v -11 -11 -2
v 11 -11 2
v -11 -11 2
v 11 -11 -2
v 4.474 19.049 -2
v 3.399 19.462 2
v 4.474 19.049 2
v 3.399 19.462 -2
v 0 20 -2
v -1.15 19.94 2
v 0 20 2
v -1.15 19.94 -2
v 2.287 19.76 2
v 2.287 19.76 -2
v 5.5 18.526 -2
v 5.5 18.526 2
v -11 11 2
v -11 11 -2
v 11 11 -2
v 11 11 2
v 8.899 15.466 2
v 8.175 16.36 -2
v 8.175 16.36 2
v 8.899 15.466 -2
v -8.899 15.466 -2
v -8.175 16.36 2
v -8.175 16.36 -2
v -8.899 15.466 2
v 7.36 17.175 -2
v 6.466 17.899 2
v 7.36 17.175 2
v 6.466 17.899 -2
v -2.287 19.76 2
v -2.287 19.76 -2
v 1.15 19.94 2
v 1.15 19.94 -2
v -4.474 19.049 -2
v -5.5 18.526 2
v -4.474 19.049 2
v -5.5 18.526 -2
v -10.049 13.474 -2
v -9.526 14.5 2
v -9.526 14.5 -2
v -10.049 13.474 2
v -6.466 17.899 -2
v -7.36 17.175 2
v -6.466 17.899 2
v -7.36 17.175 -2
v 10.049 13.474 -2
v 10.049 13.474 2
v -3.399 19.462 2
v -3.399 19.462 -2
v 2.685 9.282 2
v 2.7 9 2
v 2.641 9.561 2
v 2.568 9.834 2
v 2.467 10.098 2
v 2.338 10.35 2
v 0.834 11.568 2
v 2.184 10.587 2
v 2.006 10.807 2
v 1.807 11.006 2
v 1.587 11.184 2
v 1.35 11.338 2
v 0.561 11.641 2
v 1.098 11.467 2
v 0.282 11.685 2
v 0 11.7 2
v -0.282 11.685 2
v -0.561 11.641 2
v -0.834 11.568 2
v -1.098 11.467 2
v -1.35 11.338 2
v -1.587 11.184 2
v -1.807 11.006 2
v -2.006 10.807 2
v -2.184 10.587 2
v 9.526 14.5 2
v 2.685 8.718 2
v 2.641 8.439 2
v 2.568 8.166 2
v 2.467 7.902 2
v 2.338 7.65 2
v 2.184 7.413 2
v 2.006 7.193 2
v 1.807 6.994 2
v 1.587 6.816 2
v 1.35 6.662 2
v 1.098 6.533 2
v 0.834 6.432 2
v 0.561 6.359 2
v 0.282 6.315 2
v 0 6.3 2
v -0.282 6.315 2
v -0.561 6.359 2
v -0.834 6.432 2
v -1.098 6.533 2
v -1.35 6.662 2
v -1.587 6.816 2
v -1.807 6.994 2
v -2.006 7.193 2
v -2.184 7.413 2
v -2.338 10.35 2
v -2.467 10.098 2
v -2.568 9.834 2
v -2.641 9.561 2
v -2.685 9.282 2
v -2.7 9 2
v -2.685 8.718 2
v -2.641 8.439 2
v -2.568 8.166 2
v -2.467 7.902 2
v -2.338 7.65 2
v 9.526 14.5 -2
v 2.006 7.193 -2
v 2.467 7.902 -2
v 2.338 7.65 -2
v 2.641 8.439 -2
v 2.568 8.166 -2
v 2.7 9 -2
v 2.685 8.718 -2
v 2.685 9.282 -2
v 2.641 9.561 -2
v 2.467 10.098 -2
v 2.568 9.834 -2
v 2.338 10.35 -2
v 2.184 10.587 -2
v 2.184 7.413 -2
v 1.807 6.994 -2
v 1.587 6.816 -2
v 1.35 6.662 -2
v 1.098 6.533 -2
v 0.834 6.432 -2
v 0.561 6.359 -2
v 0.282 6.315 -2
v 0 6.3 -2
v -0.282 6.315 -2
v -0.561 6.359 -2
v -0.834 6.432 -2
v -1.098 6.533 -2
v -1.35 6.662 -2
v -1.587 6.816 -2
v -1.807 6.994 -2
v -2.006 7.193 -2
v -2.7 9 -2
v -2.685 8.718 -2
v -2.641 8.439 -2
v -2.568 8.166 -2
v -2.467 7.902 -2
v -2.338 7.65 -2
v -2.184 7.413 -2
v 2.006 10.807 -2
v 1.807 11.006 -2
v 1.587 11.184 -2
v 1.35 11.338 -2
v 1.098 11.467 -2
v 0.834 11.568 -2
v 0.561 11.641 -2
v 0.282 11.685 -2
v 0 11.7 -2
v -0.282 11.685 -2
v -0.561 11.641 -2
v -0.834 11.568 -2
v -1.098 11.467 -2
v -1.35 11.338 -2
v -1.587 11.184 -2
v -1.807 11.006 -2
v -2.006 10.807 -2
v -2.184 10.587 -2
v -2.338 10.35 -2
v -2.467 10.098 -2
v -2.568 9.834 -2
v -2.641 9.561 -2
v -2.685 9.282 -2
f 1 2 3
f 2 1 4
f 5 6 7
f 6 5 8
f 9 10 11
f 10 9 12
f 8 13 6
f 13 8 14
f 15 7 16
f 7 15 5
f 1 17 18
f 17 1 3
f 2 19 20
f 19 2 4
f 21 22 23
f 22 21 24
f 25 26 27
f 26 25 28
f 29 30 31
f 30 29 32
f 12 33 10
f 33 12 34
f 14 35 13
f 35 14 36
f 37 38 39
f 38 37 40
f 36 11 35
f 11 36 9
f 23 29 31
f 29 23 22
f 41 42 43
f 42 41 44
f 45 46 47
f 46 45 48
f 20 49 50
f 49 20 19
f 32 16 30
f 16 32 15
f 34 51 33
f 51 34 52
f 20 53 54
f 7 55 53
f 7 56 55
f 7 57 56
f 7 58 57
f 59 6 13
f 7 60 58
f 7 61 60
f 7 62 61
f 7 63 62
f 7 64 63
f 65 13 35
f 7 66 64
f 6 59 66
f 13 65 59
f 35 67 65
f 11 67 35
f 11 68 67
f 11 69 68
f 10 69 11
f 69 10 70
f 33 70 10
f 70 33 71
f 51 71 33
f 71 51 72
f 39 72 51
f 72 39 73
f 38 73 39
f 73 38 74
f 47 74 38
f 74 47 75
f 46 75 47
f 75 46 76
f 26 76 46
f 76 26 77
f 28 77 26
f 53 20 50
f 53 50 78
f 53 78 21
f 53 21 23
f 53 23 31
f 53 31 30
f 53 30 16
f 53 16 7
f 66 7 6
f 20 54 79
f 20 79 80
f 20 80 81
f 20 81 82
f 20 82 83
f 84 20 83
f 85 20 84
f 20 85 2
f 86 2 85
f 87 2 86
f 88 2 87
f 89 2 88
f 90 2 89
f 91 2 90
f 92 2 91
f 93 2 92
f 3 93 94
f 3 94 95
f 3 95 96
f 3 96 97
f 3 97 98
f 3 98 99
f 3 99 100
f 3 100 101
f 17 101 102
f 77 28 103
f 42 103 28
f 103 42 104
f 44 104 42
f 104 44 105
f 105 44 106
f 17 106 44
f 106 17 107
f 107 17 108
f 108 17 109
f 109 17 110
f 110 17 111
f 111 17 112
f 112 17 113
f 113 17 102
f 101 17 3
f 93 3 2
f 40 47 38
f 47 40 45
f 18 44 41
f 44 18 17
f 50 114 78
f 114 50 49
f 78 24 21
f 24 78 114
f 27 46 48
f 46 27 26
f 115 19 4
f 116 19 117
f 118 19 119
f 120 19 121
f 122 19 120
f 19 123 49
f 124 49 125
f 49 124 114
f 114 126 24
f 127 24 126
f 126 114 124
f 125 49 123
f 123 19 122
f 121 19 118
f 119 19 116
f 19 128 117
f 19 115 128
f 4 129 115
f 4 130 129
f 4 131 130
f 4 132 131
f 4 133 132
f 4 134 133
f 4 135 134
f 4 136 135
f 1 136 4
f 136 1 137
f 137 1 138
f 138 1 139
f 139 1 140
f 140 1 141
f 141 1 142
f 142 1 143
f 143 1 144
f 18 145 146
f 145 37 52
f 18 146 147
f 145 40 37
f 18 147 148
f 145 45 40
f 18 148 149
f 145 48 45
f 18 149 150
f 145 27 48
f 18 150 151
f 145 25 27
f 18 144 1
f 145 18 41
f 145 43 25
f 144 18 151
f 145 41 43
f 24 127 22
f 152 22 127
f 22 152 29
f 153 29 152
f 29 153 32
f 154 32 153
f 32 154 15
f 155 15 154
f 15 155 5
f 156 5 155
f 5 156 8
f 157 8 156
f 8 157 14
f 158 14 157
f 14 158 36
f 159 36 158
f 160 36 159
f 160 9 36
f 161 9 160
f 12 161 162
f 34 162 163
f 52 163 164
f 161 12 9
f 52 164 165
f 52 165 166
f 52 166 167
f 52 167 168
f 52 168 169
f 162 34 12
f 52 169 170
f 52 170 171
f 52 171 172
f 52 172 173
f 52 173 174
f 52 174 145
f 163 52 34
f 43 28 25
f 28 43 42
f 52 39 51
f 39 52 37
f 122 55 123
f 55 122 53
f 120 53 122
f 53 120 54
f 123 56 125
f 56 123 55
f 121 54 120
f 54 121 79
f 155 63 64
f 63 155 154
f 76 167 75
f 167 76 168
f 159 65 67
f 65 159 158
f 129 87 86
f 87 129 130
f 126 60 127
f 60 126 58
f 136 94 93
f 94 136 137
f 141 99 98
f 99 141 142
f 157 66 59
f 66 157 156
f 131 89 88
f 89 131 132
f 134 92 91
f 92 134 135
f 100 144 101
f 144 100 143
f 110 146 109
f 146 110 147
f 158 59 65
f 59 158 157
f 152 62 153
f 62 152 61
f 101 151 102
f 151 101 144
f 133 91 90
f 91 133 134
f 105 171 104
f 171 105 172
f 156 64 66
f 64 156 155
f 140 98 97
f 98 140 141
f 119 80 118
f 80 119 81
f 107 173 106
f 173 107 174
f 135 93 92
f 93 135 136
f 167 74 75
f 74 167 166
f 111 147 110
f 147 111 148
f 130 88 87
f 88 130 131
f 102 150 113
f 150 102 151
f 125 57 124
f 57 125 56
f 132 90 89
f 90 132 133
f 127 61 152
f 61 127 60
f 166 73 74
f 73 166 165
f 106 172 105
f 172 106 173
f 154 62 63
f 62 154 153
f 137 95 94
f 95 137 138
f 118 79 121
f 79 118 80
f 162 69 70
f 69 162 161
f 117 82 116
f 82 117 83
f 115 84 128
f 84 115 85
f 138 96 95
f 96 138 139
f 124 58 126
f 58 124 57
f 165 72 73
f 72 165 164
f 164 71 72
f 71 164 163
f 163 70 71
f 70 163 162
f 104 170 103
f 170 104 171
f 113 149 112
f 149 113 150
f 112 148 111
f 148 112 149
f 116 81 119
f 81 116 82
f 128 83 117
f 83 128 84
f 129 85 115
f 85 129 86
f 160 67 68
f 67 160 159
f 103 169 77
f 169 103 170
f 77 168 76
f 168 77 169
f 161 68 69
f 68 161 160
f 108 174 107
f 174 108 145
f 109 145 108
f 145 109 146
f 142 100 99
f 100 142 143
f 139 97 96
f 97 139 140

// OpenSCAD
// Single-hole mounting tab.
$fn = 60;
eps = 0.02;
tab_w = 22;
tab_h = 40;
tab_t = 4;
difference() {
    hull() { translate([0,0,0]) cube([tab_w,tab_w,tab_t],center=true); translate([0,tab_h/2-tab_w/2,0]) cylinder(d=tab_w,h=tab_t,center=true); }
    translate([0,tab_h/2-tab_w/2,-tab_t/2-eps]) cylinder(d=5.4,h=tab_t+2*eps);
}
